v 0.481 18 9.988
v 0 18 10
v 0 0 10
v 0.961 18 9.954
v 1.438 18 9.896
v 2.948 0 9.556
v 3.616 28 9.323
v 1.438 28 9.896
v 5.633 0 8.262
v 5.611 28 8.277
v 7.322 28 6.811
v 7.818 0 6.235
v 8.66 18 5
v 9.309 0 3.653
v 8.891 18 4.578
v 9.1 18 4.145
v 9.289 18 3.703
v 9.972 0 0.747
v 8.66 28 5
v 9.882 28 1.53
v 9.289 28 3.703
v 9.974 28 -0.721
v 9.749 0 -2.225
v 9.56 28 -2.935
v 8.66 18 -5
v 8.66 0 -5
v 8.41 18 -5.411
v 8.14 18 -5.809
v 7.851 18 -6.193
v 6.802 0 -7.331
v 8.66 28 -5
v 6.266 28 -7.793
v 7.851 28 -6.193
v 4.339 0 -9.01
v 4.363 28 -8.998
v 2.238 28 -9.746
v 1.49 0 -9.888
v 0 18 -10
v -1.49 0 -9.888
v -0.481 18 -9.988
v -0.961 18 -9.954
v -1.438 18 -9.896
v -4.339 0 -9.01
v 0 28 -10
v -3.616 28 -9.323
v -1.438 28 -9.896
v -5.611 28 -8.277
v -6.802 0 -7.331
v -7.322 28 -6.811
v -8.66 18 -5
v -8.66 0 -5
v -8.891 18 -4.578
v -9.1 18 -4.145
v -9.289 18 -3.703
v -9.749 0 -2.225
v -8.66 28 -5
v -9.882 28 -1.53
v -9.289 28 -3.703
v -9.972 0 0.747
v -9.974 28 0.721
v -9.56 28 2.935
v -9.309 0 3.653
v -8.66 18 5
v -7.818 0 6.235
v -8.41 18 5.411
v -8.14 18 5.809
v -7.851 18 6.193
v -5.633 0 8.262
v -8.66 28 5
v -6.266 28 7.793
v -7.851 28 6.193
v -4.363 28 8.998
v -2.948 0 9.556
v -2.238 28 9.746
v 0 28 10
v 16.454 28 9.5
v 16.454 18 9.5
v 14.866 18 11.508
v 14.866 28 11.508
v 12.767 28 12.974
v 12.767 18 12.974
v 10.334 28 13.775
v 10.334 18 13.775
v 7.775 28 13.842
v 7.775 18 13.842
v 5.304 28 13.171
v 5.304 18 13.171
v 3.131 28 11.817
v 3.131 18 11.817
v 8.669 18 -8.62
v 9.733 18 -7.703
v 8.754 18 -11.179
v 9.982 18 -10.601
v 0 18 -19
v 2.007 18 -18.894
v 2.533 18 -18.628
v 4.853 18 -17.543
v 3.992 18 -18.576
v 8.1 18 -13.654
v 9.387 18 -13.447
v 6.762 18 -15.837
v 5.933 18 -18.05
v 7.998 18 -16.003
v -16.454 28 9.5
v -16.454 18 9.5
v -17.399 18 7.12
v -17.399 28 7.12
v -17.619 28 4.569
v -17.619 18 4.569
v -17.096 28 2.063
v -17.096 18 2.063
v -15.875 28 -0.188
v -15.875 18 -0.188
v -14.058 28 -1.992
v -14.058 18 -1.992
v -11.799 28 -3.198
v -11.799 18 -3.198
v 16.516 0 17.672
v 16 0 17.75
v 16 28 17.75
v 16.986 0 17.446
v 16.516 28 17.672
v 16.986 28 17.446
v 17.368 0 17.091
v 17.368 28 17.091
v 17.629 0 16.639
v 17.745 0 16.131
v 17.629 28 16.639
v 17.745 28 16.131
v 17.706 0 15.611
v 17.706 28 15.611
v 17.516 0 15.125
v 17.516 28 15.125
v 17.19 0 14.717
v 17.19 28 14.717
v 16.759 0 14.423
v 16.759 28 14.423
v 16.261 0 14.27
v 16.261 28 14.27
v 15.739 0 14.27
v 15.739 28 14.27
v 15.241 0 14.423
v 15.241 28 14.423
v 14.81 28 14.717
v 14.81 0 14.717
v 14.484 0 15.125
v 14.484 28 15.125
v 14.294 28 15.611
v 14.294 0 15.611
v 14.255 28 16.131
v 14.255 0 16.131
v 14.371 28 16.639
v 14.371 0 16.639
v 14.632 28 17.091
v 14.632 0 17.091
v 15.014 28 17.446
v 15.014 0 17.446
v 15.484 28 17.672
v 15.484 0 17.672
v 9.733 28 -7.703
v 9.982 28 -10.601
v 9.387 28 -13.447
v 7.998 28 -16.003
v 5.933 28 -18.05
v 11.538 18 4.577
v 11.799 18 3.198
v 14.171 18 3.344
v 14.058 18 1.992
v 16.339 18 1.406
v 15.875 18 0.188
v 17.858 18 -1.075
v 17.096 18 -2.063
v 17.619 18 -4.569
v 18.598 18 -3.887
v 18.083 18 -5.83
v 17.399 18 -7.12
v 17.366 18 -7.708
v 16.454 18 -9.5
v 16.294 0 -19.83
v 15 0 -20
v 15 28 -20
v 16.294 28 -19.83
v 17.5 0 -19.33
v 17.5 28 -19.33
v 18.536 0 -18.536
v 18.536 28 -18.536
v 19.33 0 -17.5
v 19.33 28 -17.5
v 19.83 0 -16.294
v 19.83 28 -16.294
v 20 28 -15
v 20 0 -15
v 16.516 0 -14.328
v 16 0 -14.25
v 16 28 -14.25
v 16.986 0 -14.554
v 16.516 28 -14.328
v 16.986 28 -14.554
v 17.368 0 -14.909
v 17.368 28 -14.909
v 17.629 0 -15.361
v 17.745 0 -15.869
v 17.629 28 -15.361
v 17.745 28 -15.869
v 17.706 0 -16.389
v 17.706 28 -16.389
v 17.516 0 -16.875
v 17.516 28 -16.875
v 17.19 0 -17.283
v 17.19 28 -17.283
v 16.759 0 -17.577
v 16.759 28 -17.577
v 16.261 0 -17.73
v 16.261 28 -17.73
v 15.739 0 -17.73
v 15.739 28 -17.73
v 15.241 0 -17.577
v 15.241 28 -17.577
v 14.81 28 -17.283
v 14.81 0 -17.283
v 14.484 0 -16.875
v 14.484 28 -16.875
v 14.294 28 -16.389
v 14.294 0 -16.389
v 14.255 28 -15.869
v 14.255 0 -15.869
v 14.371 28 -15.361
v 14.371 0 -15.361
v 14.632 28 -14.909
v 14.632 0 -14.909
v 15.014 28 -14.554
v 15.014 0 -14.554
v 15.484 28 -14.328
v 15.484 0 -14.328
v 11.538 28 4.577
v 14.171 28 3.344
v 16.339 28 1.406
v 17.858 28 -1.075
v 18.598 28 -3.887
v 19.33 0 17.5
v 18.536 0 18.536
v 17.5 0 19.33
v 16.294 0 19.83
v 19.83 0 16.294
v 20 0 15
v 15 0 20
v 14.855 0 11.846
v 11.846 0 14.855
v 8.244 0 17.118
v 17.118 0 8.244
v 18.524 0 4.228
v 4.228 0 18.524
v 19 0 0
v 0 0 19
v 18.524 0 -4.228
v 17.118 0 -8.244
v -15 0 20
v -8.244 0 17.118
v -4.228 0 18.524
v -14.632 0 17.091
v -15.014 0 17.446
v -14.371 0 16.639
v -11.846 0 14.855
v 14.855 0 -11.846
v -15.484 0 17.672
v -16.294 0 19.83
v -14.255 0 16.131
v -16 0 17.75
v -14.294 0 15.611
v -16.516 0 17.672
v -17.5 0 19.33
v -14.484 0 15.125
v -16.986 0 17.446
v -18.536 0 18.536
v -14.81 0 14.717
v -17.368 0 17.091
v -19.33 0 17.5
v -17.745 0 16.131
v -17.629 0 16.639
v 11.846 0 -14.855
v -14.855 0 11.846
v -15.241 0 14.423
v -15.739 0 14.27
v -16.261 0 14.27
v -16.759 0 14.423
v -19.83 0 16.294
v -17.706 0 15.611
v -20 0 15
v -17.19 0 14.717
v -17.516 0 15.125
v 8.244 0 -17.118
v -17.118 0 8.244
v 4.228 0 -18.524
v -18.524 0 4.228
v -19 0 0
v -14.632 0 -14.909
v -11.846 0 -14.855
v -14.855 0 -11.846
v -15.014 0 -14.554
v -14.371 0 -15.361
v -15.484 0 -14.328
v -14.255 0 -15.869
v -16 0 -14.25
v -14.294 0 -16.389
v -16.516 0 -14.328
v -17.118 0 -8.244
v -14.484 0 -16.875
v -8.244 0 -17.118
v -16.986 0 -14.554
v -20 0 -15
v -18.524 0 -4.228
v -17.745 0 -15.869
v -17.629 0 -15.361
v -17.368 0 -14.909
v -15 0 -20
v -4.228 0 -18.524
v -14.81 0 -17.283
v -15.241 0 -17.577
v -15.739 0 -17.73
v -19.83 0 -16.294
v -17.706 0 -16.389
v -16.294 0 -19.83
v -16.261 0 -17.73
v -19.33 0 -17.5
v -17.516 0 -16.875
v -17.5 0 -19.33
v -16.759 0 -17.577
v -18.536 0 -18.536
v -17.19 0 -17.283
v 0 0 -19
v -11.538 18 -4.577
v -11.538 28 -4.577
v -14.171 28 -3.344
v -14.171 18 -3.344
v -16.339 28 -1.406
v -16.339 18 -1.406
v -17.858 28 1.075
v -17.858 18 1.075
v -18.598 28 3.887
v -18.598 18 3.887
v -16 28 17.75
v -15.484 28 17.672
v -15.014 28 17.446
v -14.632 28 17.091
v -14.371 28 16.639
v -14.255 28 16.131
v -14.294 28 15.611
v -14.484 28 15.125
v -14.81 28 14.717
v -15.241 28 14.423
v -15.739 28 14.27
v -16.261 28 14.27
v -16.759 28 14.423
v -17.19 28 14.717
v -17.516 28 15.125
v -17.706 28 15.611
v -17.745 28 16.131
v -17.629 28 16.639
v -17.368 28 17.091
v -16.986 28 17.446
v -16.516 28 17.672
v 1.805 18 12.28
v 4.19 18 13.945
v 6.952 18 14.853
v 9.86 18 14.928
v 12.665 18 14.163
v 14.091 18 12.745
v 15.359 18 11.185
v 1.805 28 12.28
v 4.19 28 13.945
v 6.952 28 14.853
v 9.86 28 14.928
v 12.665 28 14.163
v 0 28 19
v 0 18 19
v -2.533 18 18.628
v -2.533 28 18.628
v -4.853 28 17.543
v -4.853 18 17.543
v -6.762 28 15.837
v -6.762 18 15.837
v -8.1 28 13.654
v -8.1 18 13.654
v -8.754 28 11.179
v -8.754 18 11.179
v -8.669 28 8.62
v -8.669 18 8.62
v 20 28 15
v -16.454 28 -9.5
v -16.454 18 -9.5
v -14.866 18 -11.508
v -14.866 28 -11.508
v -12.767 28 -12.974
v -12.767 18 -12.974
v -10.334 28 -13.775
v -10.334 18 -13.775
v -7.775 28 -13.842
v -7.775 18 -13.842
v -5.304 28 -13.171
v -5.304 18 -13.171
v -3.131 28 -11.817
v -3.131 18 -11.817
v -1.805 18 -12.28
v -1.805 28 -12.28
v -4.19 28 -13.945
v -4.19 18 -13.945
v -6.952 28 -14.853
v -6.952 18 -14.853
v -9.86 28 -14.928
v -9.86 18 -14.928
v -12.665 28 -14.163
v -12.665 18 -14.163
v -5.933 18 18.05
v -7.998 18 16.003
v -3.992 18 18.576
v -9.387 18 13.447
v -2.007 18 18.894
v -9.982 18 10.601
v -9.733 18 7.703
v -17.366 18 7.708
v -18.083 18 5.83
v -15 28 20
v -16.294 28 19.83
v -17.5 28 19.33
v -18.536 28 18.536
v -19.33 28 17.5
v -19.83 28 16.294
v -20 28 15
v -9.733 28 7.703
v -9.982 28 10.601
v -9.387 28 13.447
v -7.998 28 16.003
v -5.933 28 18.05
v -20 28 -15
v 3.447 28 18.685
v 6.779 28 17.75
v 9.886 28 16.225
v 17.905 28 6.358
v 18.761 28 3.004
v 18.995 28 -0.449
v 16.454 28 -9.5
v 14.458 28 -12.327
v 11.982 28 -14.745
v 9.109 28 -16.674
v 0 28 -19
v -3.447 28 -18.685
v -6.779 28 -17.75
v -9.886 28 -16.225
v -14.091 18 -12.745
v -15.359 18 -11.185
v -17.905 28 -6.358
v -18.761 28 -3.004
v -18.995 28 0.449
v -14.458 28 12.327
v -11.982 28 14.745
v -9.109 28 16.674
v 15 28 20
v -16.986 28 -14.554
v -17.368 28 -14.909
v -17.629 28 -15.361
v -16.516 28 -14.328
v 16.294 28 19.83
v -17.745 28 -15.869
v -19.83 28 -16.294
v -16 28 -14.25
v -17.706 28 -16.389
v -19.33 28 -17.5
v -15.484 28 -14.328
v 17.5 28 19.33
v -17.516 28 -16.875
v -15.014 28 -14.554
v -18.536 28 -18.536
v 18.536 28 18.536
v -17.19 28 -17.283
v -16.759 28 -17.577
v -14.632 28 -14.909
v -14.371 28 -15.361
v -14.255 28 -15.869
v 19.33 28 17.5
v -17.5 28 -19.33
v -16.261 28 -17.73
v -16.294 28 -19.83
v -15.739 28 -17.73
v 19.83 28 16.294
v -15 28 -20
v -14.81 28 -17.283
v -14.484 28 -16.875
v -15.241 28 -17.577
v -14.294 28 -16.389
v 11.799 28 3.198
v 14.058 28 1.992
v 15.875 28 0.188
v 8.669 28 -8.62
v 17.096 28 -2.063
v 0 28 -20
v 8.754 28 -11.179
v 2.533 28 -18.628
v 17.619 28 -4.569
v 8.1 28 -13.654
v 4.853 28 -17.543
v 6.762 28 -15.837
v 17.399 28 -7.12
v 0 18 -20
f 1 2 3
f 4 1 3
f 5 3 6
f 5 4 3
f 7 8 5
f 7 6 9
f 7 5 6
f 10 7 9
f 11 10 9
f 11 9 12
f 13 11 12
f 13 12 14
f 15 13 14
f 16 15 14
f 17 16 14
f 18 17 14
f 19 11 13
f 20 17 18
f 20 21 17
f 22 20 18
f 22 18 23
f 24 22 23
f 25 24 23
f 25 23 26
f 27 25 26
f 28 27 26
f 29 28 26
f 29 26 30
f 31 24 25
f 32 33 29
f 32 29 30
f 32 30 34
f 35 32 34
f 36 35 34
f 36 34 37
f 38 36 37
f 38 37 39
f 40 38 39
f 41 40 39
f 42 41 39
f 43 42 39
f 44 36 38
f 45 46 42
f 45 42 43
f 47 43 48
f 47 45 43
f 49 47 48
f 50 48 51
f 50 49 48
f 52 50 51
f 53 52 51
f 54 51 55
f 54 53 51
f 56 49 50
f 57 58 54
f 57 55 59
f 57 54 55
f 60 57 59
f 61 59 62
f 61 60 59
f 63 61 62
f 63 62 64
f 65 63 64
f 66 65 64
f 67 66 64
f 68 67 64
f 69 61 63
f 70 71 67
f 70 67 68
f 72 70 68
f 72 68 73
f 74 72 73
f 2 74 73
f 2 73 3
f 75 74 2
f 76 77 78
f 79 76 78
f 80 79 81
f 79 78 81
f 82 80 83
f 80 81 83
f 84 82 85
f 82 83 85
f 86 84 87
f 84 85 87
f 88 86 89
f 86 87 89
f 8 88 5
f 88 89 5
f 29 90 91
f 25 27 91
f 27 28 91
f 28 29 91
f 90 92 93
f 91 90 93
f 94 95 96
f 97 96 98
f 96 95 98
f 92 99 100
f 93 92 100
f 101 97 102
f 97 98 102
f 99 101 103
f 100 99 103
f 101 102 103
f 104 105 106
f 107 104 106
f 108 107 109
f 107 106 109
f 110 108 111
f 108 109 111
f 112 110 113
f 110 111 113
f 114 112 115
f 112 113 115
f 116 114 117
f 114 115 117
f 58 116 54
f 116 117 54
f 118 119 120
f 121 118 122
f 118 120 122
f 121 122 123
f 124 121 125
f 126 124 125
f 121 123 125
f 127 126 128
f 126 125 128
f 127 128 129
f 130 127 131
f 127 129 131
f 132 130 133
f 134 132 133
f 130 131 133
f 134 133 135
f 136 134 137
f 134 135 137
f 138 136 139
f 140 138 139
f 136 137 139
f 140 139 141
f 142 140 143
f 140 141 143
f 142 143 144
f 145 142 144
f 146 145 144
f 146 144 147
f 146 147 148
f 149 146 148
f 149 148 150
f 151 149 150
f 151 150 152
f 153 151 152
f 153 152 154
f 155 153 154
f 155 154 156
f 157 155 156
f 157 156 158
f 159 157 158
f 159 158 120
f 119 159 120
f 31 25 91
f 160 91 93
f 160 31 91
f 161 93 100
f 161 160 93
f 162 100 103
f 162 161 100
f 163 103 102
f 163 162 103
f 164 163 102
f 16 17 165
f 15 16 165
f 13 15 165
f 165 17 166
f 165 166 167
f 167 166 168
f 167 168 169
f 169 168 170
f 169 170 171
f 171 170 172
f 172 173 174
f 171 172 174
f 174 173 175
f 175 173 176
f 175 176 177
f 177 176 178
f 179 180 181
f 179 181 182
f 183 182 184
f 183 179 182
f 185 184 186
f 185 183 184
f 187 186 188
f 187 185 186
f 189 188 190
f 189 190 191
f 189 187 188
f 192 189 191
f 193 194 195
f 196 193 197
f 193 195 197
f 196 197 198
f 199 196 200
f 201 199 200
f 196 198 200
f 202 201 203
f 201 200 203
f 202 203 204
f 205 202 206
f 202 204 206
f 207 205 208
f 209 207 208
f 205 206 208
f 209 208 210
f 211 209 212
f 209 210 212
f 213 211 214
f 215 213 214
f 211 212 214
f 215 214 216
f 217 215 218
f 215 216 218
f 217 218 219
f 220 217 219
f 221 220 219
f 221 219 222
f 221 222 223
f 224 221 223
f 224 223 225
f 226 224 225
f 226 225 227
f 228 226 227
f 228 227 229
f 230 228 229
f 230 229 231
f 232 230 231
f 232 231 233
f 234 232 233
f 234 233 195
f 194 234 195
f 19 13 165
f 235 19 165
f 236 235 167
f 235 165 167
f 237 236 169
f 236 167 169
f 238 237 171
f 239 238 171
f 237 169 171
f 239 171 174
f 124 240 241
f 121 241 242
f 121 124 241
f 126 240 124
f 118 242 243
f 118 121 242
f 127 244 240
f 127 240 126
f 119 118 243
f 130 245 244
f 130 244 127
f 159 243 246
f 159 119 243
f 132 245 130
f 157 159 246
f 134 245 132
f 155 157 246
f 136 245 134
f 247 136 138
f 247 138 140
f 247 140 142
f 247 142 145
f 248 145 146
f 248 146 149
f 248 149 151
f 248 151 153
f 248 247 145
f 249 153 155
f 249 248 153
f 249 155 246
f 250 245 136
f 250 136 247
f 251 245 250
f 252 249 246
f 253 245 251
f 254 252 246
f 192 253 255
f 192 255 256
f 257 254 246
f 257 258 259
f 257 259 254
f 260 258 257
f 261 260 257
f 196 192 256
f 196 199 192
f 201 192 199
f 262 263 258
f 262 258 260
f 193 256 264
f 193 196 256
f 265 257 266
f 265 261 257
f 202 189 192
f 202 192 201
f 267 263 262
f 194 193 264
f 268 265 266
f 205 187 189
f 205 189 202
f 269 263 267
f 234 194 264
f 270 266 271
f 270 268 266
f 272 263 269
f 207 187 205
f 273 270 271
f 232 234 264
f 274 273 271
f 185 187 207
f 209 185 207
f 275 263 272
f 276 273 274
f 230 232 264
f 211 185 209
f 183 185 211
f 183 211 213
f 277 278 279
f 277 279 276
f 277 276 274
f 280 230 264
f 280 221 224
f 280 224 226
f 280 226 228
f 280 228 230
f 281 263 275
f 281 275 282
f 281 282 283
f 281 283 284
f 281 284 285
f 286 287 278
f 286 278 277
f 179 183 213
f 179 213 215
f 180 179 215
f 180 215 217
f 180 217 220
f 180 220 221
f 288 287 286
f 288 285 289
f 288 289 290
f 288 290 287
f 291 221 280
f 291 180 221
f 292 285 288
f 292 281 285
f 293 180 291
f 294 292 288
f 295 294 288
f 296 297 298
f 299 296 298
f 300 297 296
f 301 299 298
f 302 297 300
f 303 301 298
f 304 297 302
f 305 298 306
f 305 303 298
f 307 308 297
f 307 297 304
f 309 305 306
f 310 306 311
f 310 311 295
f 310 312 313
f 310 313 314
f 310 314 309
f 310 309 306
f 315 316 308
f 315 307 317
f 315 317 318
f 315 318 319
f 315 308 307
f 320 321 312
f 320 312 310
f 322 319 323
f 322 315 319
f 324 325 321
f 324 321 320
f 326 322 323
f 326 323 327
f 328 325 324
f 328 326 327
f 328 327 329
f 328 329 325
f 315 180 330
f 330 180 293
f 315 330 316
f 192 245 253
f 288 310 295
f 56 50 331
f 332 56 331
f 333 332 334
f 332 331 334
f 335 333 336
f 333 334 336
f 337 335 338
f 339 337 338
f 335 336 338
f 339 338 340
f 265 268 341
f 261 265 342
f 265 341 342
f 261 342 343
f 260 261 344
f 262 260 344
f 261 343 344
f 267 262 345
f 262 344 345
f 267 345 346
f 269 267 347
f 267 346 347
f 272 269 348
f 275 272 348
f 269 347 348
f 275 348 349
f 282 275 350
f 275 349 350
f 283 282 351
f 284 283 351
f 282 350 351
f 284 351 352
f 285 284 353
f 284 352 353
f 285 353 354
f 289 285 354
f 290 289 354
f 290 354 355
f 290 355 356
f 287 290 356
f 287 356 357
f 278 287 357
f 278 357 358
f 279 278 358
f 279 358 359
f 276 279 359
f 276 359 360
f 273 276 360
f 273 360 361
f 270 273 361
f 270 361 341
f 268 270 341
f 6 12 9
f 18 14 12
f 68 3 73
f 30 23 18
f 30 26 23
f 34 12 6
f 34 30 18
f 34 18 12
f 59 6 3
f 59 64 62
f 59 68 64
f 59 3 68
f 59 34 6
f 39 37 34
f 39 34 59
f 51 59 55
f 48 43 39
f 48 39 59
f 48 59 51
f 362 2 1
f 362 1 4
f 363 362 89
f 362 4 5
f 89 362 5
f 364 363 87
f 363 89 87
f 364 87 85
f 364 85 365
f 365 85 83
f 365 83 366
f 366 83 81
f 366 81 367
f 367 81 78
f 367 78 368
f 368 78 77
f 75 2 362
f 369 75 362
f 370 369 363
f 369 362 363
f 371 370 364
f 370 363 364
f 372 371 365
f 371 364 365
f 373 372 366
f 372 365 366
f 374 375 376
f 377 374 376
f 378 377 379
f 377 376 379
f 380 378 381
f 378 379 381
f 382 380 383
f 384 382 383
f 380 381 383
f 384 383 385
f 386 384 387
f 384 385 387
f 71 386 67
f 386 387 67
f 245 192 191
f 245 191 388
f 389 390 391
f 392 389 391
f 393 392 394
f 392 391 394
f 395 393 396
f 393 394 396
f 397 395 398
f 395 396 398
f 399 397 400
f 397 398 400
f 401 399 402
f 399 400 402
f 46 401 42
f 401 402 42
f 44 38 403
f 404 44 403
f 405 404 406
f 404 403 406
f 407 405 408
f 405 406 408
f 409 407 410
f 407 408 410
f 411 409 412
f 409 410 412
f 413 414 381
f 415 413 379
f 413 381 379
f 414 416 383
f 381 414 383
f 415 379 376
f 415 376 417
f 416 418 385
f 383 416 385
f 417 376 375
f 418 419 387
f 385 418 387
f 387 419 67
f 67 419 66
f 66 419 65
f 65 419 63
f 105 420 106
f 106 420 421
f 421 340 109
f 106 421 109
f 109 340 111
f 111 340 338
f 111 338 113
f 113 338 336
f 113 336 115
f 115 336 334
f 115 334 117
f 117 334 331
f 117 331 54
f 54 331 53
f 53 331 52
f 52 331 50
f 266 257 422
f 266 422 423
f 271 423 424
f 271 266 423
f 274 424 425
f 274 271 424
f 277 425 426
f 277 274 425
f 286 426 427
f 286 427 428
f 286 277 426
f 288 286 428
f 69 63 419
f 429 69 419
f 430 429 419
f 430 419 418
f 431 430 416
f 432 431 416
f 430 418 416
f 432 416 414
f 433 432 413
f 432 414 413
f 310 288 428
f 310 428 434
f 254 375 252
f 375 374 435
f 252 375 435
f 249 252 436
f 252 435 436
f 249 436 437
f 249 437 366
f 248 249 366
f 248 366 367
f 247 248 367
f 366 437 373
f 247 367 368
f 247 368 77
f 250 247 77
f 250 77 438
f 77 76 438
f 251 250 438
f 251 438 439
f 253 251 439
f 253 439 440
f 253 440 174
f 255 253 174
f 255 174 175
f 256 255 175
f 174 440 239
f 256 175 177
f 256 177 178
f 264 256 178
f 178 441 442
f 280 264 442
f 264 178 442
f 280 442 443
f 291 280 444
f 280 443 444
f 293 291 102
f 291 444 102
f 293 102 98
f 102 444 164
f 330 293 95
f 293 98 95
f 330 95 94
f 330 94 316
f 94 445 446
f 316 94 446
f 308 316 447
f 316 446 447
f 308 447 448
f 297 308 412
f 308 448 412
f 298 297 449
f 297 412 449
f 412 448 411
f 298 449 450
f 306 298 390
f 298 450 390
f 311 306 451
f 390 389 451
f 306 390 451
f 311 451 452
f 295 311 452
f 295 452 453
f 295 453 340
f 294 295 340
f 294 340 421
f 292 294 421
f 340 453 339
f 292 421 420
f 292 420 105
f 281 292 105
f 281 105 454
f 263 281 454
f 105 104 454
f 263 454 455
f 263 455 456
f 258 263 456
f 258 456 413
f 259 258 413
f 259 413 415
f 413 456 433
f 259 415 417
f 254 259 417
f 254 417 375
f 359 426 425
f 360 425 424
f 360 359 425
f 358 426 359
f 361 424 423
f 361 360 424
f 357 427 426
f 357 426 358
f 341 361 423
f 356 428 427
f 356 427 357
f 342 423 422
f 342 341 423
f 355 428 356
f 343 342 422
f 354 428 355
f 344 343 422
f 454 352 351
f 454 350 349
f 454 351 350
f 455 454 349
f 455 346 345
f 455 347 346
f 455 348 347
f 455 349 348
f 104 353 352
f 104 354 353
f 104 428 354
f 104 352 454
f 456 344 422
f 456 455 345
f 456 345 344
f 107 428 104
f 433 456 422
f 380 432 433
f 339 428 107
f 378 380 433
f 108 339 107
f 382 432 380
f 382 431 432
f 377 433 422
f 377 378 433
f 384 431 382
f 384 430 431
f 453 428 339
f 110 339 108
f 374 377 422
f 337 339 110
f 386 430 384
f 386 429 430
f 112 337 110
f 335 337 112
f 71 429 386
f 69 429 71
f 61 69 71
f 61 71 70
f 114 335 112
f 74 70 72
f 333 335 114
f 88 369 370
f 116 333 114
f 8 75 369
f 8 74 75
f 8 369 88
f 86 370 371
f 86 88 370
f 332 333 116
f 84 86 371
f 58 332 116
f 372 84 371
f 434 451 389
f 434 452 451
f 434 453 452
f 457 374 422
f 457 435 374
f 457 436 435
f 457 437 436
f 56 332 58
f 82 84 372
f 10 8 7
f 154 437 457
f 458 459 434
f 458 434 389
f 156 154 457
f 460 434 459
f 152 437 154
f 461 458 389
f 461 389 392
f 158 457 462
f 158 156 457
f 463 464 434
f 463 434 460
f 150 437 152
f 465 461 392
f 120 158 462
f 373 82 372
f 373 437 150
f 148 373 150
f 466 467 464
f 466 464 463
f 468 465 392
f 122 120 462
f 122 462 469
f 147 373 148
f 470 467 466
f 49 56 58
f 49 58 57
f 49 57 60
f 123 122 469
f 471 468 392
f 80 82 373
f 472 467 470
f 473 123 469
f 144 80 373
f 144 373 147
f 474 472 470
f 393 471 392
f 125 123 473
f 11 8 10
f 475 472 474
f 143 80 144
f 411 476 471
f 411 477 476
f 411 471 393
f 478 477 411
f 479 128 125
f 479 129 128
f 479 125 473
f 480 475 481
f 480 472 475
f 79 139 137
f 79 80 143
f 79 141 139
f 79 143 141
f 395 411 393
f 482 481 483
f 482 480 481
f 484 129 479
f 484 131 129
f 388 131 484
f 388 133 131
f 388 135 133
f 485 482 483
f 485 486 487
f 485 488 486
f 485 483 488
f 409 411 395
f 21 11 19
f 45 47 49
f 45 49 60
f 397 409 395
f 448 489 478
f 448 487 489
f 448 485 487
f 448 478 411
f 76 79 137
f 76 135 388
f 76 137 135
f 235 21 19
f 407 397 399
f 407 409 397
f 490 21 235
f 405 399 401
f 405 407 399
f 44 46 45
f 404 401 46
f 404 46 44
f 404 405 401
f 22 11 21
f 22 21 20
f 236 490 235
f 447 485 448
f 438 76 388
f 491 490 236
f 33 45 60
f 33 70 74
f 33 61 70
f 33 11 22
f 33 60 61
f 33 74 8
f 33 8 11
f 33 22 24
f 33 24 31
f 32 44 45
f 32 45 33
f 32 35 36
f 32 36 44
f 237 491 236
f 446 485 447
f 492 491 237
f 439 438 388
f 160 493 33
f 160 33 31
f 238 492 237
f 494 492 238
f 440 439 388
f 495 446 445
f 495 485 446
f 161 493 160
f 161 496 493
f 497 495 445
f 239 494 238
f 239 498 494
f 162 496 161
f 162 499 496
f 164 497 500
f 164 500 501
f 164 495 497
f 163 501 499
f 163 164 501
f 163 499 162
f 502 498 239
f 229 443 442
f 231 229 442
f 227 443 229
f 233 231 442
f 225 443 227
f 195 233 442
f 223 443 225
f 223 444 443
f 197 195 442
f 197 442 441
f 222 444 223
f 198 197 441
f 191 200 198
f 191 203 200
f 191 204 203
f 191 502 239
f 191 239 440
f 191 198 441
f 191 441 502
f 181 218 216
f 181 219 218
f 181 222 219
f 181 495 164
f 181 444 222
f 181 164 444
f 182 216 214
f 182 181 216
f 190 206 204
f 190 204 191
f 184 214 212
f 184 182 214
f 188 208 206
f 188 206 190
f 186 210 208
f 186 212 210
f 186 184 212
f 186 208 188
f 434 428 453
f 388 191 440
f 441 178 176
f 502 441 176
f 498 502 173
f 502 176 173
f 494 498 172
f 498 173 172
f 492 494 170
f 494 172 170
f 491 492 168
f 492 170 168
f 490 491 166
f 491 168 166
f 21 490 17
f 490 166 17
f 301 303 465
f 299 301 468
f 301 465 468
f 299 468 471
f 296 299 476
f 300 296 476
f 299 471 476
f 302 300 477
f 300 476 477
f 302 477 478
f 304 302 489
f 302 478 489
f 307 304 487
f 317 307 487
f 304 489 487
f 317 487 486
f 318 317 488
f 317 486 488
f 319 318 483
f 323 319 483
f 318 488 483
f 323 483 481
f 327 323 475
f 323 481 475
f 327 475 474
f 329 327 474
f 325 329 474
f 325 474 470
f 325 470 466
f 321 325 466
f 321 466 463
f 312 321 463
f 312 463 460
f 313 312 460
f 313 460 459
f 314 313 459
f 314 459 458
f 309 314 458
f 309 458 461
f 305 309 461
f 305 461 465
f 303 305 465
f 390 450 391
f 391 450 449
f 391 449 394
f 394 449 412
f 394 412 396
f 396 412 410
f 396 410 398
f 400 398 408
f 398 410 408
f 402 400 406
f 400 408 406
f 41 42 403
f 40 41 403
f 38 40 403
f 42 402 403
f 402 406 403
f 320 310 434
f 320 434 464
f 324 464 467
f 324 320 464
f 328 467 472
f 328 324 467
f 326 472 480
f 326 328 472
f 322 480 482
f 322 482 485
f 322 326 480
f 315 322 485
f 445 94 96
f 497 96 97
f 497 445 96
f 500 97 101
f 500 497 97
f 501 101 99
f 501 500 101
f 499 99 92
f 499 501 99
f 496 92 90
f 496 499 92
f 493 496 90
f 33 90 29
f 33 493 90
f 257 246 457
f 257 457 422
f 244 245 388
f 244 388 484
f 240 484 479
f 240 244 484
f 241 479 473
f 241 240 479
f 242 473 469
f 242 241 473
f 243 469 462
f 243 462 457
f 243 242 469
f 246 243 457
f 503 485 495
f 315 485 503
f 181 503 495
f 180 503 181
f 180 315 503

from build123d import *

# Parameters (mm, degrees)
EXTRUDE_1_DEPTH          = 28
SKETCH_2_R               = 1.75
CUT_EXTRUDE_1_DEPTH      = 40.799497484
SKETCH_3_R               = 19
SKETCH_3_R_2             = 10
CUT_EXTRUDE_2_DEPTH      = 40.799497484
EXTRUDE_2_DEPTH          = 10
PATTERN_START            = 18
PATTERN_CIRCULAR_1_DEPTH = 10


# Read off the part's stored shape, not the designer's step: 阵列(圆周)1
with BuildPart() as part:
    # 草图1 → 凸台-拉伸1 (new body)
    with BuildSketch(Plane(origin=(0, 0, 0), x_dir=(1, 0, 0), z_dir=(0, 1, 0))):
        with BuildLine():
            Line((-15, 20), (15, 20))
            ThreePointArc((15, 20), (18.535533906, 18.535533906), (20, 15))
            Line((20, 15), (20, -15))
            ThreePointArc((20, -15), (18.535533906, -18.535533906), (15, -20))
            Line((15, -20), (-15, -20))
            ThreePointArc((-15, -20), (-18.535533906, -18.535533906), (-20, -15))
            Line((-20, -15), (-20, 15))
            ThreePointArc((-20, 15), (-18.535533906, 18.535533906), (-15, 20))
        make_face()
    extrude(amount=EXTRUDE_1_DEPTH)

    # 草图2 → 切除-拉伸1 (cut, through all)
    with BuildSketch(Plane(origin=(0, 28, 0), x_dir=(1, 0, 0), z_dir=(0, 1, 0))):
        with Locations(Location((-16, 16, 0), (0, 0, 270))):
            Circle(SKETCH_2_R)
        with Locations(Location((16, 16, 0), (0, 0, 270))):
            Circle(SKETCH_2_R)
        with Locations(Location((16, -16, 0), (0, 0, 270))):
            Circle(SKETCH_2_R)
        with Locations(Location((-16, -16, 0), (0, 0, 270))):
            Circle(SKETCH_2_R)
    extrude(amount=-CUT_EXTRUDE_1_DEPTH, mode=Mode.SUBTRACT)

    # 草图3 → 切除-拉伸2 (cut, through all)
    with BuildSketch(Plane(origin=(0, 28, 0), x_dir=(1, 0, 0), z_dir=(0, 1, 0))):
        with Locations(Location((0, 0, 0), (0, 0, 270))):
            Circle(SKETCH_3_R)
        with Locations(Location((0, 0, 0), (0, 0, 270))):
            Circle(SKETCH_3_R_2, mode=Mode.SUBTRACT)
    extrude(amount=-CUT_EXTRUDE_2_DEPTH, mode=Mode.SUBTRACT)


with BuildPart() as cut_extrude_2_piece_1:
    # of the separate pieces the step leaves, piece 1, a body of its own (cut_extrude_2_pieces)
    add(part.part.solids().sort_by_distance((-15, 0, -20))[0])



with BuildPart() as cut_extrude_2_piece_2:
    # of the separate pieces the step leaves, piece 2, a body of its own (cut_extrude_2_pieces)
    add(part.part.solids().sort_by_distance((0, 0, 10))[0])


with BuildPart() as cut_extrude_2_piece_1_1:
    add(cut_extrude_2_piece_1.part)

    add(cut_extrude_2_piece_2.part)  # 凸台-拉伸2 merges 切除-拉伸2 piece 2
    # 草图4 → 凸台-拉伸2 (add)
    with BuildSketch(Plane(origin=(0, 28, 0), x_dir=(1, 0, 0), z_dir=(0, 1, 0))):
        with BuildLine():
            Line((0, 20), (0, 19))
            ThreePointArc((0, 19), (8.809946394, 10.190053606), (0, 1.380107213))
            Line((0, 1.380107213), (0, 0))
            ThreePointArc((0, 0), (10, 10), (0, 20))
        make_face()
    extrude(amount=-EXTRUDE_2_DEPTH)

    # 阵列(圆周)1 outline → 阵列(圆周)1 (add)
    with BuildSketch(Plane(origin=(0, 0, 0), x_dir=(1, 0, 0), z_dir=(0, 1, 0)).offset(PATTERN_START)):
        with BuildLine():
            ThreePointArc((-1.43801989, 9.896064814), (-0.720885519, 9.973982358), (0, 10))
            ThreePointArc((0, 10), (-5.537755039, 14.5), (-12.665384489, 14.162910568))
            ThreePointArc((-12.665384489, 14.162910568), (-14.745417919, 11.982180536), (-16.454482672, 9.5))
            ThreePointArc((-16.454482672, 9.5), (-9.057130134, 13.90191043), (-1.43801989, 9.896064814))
        make_face()
        with BuildLine():
            ThreePointArc((18.598132588, 3.887089432), (17.749581696, 6.778816239), (16.454482672, 9.5))
            ThreePointArc((16.454482672, 9.5), (16.56797266, 0.892749566), (9.289253471, -3.702670651))
            ThreePointArc((9.289253471, -3.702670651), (8.998164858, -4.362686006), (8.660254038, -5))
            ThreePointArc((8.660254038, -5), (15.326245874, -2.454163457), (18.598132588, 3.887089432))
        make_face()
        with BuildLine():
            ThreePointArc((-9.289253471, 3.702670651), (-8.998164858, 4.362686006), (-8.660254038, 5))
            ThreePointArc((-8.660254038, 5), (-15.326245874, 2.454163457), (-18.598132588, -3.887089432))
            ThreePointArc((-18.598132588, -3.887089432), (-17.749581696, -6.778816239), (-16.454482672, -9.5))
            ThreePointArc((-16.454482672, -9.5), (-16.56797266, -0.892749566), (-9.289253471, 3.702670651))
        make_face()
        with BuildLine():
            ThreePointArc((16.454482672, -9.5), (9.057130134, -13.90191043), (1.43801989, -9.896064814))
            ThreePointArc((1.43801989, -9.896064814), (0.720885519, -9.973982358), (0, -10))
            ThreePointArc((0, -10), (5.537755039, -14.5), (12.665384489, -14.162910568))
            ThreePointArc((12.665384489, -14.162910568), (14.745417919, -11.982180536), (16.454482672, -9.5))
        make_face()
        with BuildLine():
            ThreePointArc((-7.851233581, -6.193394163), (-8.277279339, -5.611296352), (-8.660254038, -5))
            ThreePointArc((-8.660254038, -5), (-9.788490836, -12.045836544), (-5.932748098, -18.05))
            ThreePointArc((-5.932748098, -18.05), (-3.004163777, -18.760996775), (0, -19))
            ThreePointArc((0, -19), (-7.510842526, -14.794659996), (-7.851233581, -6.193394163))
        make_face()
    extrude(amount=PATTERN_CIRCULAR_1_DEPTH)


solid = cut_extrude_2_piece_1_1.part
